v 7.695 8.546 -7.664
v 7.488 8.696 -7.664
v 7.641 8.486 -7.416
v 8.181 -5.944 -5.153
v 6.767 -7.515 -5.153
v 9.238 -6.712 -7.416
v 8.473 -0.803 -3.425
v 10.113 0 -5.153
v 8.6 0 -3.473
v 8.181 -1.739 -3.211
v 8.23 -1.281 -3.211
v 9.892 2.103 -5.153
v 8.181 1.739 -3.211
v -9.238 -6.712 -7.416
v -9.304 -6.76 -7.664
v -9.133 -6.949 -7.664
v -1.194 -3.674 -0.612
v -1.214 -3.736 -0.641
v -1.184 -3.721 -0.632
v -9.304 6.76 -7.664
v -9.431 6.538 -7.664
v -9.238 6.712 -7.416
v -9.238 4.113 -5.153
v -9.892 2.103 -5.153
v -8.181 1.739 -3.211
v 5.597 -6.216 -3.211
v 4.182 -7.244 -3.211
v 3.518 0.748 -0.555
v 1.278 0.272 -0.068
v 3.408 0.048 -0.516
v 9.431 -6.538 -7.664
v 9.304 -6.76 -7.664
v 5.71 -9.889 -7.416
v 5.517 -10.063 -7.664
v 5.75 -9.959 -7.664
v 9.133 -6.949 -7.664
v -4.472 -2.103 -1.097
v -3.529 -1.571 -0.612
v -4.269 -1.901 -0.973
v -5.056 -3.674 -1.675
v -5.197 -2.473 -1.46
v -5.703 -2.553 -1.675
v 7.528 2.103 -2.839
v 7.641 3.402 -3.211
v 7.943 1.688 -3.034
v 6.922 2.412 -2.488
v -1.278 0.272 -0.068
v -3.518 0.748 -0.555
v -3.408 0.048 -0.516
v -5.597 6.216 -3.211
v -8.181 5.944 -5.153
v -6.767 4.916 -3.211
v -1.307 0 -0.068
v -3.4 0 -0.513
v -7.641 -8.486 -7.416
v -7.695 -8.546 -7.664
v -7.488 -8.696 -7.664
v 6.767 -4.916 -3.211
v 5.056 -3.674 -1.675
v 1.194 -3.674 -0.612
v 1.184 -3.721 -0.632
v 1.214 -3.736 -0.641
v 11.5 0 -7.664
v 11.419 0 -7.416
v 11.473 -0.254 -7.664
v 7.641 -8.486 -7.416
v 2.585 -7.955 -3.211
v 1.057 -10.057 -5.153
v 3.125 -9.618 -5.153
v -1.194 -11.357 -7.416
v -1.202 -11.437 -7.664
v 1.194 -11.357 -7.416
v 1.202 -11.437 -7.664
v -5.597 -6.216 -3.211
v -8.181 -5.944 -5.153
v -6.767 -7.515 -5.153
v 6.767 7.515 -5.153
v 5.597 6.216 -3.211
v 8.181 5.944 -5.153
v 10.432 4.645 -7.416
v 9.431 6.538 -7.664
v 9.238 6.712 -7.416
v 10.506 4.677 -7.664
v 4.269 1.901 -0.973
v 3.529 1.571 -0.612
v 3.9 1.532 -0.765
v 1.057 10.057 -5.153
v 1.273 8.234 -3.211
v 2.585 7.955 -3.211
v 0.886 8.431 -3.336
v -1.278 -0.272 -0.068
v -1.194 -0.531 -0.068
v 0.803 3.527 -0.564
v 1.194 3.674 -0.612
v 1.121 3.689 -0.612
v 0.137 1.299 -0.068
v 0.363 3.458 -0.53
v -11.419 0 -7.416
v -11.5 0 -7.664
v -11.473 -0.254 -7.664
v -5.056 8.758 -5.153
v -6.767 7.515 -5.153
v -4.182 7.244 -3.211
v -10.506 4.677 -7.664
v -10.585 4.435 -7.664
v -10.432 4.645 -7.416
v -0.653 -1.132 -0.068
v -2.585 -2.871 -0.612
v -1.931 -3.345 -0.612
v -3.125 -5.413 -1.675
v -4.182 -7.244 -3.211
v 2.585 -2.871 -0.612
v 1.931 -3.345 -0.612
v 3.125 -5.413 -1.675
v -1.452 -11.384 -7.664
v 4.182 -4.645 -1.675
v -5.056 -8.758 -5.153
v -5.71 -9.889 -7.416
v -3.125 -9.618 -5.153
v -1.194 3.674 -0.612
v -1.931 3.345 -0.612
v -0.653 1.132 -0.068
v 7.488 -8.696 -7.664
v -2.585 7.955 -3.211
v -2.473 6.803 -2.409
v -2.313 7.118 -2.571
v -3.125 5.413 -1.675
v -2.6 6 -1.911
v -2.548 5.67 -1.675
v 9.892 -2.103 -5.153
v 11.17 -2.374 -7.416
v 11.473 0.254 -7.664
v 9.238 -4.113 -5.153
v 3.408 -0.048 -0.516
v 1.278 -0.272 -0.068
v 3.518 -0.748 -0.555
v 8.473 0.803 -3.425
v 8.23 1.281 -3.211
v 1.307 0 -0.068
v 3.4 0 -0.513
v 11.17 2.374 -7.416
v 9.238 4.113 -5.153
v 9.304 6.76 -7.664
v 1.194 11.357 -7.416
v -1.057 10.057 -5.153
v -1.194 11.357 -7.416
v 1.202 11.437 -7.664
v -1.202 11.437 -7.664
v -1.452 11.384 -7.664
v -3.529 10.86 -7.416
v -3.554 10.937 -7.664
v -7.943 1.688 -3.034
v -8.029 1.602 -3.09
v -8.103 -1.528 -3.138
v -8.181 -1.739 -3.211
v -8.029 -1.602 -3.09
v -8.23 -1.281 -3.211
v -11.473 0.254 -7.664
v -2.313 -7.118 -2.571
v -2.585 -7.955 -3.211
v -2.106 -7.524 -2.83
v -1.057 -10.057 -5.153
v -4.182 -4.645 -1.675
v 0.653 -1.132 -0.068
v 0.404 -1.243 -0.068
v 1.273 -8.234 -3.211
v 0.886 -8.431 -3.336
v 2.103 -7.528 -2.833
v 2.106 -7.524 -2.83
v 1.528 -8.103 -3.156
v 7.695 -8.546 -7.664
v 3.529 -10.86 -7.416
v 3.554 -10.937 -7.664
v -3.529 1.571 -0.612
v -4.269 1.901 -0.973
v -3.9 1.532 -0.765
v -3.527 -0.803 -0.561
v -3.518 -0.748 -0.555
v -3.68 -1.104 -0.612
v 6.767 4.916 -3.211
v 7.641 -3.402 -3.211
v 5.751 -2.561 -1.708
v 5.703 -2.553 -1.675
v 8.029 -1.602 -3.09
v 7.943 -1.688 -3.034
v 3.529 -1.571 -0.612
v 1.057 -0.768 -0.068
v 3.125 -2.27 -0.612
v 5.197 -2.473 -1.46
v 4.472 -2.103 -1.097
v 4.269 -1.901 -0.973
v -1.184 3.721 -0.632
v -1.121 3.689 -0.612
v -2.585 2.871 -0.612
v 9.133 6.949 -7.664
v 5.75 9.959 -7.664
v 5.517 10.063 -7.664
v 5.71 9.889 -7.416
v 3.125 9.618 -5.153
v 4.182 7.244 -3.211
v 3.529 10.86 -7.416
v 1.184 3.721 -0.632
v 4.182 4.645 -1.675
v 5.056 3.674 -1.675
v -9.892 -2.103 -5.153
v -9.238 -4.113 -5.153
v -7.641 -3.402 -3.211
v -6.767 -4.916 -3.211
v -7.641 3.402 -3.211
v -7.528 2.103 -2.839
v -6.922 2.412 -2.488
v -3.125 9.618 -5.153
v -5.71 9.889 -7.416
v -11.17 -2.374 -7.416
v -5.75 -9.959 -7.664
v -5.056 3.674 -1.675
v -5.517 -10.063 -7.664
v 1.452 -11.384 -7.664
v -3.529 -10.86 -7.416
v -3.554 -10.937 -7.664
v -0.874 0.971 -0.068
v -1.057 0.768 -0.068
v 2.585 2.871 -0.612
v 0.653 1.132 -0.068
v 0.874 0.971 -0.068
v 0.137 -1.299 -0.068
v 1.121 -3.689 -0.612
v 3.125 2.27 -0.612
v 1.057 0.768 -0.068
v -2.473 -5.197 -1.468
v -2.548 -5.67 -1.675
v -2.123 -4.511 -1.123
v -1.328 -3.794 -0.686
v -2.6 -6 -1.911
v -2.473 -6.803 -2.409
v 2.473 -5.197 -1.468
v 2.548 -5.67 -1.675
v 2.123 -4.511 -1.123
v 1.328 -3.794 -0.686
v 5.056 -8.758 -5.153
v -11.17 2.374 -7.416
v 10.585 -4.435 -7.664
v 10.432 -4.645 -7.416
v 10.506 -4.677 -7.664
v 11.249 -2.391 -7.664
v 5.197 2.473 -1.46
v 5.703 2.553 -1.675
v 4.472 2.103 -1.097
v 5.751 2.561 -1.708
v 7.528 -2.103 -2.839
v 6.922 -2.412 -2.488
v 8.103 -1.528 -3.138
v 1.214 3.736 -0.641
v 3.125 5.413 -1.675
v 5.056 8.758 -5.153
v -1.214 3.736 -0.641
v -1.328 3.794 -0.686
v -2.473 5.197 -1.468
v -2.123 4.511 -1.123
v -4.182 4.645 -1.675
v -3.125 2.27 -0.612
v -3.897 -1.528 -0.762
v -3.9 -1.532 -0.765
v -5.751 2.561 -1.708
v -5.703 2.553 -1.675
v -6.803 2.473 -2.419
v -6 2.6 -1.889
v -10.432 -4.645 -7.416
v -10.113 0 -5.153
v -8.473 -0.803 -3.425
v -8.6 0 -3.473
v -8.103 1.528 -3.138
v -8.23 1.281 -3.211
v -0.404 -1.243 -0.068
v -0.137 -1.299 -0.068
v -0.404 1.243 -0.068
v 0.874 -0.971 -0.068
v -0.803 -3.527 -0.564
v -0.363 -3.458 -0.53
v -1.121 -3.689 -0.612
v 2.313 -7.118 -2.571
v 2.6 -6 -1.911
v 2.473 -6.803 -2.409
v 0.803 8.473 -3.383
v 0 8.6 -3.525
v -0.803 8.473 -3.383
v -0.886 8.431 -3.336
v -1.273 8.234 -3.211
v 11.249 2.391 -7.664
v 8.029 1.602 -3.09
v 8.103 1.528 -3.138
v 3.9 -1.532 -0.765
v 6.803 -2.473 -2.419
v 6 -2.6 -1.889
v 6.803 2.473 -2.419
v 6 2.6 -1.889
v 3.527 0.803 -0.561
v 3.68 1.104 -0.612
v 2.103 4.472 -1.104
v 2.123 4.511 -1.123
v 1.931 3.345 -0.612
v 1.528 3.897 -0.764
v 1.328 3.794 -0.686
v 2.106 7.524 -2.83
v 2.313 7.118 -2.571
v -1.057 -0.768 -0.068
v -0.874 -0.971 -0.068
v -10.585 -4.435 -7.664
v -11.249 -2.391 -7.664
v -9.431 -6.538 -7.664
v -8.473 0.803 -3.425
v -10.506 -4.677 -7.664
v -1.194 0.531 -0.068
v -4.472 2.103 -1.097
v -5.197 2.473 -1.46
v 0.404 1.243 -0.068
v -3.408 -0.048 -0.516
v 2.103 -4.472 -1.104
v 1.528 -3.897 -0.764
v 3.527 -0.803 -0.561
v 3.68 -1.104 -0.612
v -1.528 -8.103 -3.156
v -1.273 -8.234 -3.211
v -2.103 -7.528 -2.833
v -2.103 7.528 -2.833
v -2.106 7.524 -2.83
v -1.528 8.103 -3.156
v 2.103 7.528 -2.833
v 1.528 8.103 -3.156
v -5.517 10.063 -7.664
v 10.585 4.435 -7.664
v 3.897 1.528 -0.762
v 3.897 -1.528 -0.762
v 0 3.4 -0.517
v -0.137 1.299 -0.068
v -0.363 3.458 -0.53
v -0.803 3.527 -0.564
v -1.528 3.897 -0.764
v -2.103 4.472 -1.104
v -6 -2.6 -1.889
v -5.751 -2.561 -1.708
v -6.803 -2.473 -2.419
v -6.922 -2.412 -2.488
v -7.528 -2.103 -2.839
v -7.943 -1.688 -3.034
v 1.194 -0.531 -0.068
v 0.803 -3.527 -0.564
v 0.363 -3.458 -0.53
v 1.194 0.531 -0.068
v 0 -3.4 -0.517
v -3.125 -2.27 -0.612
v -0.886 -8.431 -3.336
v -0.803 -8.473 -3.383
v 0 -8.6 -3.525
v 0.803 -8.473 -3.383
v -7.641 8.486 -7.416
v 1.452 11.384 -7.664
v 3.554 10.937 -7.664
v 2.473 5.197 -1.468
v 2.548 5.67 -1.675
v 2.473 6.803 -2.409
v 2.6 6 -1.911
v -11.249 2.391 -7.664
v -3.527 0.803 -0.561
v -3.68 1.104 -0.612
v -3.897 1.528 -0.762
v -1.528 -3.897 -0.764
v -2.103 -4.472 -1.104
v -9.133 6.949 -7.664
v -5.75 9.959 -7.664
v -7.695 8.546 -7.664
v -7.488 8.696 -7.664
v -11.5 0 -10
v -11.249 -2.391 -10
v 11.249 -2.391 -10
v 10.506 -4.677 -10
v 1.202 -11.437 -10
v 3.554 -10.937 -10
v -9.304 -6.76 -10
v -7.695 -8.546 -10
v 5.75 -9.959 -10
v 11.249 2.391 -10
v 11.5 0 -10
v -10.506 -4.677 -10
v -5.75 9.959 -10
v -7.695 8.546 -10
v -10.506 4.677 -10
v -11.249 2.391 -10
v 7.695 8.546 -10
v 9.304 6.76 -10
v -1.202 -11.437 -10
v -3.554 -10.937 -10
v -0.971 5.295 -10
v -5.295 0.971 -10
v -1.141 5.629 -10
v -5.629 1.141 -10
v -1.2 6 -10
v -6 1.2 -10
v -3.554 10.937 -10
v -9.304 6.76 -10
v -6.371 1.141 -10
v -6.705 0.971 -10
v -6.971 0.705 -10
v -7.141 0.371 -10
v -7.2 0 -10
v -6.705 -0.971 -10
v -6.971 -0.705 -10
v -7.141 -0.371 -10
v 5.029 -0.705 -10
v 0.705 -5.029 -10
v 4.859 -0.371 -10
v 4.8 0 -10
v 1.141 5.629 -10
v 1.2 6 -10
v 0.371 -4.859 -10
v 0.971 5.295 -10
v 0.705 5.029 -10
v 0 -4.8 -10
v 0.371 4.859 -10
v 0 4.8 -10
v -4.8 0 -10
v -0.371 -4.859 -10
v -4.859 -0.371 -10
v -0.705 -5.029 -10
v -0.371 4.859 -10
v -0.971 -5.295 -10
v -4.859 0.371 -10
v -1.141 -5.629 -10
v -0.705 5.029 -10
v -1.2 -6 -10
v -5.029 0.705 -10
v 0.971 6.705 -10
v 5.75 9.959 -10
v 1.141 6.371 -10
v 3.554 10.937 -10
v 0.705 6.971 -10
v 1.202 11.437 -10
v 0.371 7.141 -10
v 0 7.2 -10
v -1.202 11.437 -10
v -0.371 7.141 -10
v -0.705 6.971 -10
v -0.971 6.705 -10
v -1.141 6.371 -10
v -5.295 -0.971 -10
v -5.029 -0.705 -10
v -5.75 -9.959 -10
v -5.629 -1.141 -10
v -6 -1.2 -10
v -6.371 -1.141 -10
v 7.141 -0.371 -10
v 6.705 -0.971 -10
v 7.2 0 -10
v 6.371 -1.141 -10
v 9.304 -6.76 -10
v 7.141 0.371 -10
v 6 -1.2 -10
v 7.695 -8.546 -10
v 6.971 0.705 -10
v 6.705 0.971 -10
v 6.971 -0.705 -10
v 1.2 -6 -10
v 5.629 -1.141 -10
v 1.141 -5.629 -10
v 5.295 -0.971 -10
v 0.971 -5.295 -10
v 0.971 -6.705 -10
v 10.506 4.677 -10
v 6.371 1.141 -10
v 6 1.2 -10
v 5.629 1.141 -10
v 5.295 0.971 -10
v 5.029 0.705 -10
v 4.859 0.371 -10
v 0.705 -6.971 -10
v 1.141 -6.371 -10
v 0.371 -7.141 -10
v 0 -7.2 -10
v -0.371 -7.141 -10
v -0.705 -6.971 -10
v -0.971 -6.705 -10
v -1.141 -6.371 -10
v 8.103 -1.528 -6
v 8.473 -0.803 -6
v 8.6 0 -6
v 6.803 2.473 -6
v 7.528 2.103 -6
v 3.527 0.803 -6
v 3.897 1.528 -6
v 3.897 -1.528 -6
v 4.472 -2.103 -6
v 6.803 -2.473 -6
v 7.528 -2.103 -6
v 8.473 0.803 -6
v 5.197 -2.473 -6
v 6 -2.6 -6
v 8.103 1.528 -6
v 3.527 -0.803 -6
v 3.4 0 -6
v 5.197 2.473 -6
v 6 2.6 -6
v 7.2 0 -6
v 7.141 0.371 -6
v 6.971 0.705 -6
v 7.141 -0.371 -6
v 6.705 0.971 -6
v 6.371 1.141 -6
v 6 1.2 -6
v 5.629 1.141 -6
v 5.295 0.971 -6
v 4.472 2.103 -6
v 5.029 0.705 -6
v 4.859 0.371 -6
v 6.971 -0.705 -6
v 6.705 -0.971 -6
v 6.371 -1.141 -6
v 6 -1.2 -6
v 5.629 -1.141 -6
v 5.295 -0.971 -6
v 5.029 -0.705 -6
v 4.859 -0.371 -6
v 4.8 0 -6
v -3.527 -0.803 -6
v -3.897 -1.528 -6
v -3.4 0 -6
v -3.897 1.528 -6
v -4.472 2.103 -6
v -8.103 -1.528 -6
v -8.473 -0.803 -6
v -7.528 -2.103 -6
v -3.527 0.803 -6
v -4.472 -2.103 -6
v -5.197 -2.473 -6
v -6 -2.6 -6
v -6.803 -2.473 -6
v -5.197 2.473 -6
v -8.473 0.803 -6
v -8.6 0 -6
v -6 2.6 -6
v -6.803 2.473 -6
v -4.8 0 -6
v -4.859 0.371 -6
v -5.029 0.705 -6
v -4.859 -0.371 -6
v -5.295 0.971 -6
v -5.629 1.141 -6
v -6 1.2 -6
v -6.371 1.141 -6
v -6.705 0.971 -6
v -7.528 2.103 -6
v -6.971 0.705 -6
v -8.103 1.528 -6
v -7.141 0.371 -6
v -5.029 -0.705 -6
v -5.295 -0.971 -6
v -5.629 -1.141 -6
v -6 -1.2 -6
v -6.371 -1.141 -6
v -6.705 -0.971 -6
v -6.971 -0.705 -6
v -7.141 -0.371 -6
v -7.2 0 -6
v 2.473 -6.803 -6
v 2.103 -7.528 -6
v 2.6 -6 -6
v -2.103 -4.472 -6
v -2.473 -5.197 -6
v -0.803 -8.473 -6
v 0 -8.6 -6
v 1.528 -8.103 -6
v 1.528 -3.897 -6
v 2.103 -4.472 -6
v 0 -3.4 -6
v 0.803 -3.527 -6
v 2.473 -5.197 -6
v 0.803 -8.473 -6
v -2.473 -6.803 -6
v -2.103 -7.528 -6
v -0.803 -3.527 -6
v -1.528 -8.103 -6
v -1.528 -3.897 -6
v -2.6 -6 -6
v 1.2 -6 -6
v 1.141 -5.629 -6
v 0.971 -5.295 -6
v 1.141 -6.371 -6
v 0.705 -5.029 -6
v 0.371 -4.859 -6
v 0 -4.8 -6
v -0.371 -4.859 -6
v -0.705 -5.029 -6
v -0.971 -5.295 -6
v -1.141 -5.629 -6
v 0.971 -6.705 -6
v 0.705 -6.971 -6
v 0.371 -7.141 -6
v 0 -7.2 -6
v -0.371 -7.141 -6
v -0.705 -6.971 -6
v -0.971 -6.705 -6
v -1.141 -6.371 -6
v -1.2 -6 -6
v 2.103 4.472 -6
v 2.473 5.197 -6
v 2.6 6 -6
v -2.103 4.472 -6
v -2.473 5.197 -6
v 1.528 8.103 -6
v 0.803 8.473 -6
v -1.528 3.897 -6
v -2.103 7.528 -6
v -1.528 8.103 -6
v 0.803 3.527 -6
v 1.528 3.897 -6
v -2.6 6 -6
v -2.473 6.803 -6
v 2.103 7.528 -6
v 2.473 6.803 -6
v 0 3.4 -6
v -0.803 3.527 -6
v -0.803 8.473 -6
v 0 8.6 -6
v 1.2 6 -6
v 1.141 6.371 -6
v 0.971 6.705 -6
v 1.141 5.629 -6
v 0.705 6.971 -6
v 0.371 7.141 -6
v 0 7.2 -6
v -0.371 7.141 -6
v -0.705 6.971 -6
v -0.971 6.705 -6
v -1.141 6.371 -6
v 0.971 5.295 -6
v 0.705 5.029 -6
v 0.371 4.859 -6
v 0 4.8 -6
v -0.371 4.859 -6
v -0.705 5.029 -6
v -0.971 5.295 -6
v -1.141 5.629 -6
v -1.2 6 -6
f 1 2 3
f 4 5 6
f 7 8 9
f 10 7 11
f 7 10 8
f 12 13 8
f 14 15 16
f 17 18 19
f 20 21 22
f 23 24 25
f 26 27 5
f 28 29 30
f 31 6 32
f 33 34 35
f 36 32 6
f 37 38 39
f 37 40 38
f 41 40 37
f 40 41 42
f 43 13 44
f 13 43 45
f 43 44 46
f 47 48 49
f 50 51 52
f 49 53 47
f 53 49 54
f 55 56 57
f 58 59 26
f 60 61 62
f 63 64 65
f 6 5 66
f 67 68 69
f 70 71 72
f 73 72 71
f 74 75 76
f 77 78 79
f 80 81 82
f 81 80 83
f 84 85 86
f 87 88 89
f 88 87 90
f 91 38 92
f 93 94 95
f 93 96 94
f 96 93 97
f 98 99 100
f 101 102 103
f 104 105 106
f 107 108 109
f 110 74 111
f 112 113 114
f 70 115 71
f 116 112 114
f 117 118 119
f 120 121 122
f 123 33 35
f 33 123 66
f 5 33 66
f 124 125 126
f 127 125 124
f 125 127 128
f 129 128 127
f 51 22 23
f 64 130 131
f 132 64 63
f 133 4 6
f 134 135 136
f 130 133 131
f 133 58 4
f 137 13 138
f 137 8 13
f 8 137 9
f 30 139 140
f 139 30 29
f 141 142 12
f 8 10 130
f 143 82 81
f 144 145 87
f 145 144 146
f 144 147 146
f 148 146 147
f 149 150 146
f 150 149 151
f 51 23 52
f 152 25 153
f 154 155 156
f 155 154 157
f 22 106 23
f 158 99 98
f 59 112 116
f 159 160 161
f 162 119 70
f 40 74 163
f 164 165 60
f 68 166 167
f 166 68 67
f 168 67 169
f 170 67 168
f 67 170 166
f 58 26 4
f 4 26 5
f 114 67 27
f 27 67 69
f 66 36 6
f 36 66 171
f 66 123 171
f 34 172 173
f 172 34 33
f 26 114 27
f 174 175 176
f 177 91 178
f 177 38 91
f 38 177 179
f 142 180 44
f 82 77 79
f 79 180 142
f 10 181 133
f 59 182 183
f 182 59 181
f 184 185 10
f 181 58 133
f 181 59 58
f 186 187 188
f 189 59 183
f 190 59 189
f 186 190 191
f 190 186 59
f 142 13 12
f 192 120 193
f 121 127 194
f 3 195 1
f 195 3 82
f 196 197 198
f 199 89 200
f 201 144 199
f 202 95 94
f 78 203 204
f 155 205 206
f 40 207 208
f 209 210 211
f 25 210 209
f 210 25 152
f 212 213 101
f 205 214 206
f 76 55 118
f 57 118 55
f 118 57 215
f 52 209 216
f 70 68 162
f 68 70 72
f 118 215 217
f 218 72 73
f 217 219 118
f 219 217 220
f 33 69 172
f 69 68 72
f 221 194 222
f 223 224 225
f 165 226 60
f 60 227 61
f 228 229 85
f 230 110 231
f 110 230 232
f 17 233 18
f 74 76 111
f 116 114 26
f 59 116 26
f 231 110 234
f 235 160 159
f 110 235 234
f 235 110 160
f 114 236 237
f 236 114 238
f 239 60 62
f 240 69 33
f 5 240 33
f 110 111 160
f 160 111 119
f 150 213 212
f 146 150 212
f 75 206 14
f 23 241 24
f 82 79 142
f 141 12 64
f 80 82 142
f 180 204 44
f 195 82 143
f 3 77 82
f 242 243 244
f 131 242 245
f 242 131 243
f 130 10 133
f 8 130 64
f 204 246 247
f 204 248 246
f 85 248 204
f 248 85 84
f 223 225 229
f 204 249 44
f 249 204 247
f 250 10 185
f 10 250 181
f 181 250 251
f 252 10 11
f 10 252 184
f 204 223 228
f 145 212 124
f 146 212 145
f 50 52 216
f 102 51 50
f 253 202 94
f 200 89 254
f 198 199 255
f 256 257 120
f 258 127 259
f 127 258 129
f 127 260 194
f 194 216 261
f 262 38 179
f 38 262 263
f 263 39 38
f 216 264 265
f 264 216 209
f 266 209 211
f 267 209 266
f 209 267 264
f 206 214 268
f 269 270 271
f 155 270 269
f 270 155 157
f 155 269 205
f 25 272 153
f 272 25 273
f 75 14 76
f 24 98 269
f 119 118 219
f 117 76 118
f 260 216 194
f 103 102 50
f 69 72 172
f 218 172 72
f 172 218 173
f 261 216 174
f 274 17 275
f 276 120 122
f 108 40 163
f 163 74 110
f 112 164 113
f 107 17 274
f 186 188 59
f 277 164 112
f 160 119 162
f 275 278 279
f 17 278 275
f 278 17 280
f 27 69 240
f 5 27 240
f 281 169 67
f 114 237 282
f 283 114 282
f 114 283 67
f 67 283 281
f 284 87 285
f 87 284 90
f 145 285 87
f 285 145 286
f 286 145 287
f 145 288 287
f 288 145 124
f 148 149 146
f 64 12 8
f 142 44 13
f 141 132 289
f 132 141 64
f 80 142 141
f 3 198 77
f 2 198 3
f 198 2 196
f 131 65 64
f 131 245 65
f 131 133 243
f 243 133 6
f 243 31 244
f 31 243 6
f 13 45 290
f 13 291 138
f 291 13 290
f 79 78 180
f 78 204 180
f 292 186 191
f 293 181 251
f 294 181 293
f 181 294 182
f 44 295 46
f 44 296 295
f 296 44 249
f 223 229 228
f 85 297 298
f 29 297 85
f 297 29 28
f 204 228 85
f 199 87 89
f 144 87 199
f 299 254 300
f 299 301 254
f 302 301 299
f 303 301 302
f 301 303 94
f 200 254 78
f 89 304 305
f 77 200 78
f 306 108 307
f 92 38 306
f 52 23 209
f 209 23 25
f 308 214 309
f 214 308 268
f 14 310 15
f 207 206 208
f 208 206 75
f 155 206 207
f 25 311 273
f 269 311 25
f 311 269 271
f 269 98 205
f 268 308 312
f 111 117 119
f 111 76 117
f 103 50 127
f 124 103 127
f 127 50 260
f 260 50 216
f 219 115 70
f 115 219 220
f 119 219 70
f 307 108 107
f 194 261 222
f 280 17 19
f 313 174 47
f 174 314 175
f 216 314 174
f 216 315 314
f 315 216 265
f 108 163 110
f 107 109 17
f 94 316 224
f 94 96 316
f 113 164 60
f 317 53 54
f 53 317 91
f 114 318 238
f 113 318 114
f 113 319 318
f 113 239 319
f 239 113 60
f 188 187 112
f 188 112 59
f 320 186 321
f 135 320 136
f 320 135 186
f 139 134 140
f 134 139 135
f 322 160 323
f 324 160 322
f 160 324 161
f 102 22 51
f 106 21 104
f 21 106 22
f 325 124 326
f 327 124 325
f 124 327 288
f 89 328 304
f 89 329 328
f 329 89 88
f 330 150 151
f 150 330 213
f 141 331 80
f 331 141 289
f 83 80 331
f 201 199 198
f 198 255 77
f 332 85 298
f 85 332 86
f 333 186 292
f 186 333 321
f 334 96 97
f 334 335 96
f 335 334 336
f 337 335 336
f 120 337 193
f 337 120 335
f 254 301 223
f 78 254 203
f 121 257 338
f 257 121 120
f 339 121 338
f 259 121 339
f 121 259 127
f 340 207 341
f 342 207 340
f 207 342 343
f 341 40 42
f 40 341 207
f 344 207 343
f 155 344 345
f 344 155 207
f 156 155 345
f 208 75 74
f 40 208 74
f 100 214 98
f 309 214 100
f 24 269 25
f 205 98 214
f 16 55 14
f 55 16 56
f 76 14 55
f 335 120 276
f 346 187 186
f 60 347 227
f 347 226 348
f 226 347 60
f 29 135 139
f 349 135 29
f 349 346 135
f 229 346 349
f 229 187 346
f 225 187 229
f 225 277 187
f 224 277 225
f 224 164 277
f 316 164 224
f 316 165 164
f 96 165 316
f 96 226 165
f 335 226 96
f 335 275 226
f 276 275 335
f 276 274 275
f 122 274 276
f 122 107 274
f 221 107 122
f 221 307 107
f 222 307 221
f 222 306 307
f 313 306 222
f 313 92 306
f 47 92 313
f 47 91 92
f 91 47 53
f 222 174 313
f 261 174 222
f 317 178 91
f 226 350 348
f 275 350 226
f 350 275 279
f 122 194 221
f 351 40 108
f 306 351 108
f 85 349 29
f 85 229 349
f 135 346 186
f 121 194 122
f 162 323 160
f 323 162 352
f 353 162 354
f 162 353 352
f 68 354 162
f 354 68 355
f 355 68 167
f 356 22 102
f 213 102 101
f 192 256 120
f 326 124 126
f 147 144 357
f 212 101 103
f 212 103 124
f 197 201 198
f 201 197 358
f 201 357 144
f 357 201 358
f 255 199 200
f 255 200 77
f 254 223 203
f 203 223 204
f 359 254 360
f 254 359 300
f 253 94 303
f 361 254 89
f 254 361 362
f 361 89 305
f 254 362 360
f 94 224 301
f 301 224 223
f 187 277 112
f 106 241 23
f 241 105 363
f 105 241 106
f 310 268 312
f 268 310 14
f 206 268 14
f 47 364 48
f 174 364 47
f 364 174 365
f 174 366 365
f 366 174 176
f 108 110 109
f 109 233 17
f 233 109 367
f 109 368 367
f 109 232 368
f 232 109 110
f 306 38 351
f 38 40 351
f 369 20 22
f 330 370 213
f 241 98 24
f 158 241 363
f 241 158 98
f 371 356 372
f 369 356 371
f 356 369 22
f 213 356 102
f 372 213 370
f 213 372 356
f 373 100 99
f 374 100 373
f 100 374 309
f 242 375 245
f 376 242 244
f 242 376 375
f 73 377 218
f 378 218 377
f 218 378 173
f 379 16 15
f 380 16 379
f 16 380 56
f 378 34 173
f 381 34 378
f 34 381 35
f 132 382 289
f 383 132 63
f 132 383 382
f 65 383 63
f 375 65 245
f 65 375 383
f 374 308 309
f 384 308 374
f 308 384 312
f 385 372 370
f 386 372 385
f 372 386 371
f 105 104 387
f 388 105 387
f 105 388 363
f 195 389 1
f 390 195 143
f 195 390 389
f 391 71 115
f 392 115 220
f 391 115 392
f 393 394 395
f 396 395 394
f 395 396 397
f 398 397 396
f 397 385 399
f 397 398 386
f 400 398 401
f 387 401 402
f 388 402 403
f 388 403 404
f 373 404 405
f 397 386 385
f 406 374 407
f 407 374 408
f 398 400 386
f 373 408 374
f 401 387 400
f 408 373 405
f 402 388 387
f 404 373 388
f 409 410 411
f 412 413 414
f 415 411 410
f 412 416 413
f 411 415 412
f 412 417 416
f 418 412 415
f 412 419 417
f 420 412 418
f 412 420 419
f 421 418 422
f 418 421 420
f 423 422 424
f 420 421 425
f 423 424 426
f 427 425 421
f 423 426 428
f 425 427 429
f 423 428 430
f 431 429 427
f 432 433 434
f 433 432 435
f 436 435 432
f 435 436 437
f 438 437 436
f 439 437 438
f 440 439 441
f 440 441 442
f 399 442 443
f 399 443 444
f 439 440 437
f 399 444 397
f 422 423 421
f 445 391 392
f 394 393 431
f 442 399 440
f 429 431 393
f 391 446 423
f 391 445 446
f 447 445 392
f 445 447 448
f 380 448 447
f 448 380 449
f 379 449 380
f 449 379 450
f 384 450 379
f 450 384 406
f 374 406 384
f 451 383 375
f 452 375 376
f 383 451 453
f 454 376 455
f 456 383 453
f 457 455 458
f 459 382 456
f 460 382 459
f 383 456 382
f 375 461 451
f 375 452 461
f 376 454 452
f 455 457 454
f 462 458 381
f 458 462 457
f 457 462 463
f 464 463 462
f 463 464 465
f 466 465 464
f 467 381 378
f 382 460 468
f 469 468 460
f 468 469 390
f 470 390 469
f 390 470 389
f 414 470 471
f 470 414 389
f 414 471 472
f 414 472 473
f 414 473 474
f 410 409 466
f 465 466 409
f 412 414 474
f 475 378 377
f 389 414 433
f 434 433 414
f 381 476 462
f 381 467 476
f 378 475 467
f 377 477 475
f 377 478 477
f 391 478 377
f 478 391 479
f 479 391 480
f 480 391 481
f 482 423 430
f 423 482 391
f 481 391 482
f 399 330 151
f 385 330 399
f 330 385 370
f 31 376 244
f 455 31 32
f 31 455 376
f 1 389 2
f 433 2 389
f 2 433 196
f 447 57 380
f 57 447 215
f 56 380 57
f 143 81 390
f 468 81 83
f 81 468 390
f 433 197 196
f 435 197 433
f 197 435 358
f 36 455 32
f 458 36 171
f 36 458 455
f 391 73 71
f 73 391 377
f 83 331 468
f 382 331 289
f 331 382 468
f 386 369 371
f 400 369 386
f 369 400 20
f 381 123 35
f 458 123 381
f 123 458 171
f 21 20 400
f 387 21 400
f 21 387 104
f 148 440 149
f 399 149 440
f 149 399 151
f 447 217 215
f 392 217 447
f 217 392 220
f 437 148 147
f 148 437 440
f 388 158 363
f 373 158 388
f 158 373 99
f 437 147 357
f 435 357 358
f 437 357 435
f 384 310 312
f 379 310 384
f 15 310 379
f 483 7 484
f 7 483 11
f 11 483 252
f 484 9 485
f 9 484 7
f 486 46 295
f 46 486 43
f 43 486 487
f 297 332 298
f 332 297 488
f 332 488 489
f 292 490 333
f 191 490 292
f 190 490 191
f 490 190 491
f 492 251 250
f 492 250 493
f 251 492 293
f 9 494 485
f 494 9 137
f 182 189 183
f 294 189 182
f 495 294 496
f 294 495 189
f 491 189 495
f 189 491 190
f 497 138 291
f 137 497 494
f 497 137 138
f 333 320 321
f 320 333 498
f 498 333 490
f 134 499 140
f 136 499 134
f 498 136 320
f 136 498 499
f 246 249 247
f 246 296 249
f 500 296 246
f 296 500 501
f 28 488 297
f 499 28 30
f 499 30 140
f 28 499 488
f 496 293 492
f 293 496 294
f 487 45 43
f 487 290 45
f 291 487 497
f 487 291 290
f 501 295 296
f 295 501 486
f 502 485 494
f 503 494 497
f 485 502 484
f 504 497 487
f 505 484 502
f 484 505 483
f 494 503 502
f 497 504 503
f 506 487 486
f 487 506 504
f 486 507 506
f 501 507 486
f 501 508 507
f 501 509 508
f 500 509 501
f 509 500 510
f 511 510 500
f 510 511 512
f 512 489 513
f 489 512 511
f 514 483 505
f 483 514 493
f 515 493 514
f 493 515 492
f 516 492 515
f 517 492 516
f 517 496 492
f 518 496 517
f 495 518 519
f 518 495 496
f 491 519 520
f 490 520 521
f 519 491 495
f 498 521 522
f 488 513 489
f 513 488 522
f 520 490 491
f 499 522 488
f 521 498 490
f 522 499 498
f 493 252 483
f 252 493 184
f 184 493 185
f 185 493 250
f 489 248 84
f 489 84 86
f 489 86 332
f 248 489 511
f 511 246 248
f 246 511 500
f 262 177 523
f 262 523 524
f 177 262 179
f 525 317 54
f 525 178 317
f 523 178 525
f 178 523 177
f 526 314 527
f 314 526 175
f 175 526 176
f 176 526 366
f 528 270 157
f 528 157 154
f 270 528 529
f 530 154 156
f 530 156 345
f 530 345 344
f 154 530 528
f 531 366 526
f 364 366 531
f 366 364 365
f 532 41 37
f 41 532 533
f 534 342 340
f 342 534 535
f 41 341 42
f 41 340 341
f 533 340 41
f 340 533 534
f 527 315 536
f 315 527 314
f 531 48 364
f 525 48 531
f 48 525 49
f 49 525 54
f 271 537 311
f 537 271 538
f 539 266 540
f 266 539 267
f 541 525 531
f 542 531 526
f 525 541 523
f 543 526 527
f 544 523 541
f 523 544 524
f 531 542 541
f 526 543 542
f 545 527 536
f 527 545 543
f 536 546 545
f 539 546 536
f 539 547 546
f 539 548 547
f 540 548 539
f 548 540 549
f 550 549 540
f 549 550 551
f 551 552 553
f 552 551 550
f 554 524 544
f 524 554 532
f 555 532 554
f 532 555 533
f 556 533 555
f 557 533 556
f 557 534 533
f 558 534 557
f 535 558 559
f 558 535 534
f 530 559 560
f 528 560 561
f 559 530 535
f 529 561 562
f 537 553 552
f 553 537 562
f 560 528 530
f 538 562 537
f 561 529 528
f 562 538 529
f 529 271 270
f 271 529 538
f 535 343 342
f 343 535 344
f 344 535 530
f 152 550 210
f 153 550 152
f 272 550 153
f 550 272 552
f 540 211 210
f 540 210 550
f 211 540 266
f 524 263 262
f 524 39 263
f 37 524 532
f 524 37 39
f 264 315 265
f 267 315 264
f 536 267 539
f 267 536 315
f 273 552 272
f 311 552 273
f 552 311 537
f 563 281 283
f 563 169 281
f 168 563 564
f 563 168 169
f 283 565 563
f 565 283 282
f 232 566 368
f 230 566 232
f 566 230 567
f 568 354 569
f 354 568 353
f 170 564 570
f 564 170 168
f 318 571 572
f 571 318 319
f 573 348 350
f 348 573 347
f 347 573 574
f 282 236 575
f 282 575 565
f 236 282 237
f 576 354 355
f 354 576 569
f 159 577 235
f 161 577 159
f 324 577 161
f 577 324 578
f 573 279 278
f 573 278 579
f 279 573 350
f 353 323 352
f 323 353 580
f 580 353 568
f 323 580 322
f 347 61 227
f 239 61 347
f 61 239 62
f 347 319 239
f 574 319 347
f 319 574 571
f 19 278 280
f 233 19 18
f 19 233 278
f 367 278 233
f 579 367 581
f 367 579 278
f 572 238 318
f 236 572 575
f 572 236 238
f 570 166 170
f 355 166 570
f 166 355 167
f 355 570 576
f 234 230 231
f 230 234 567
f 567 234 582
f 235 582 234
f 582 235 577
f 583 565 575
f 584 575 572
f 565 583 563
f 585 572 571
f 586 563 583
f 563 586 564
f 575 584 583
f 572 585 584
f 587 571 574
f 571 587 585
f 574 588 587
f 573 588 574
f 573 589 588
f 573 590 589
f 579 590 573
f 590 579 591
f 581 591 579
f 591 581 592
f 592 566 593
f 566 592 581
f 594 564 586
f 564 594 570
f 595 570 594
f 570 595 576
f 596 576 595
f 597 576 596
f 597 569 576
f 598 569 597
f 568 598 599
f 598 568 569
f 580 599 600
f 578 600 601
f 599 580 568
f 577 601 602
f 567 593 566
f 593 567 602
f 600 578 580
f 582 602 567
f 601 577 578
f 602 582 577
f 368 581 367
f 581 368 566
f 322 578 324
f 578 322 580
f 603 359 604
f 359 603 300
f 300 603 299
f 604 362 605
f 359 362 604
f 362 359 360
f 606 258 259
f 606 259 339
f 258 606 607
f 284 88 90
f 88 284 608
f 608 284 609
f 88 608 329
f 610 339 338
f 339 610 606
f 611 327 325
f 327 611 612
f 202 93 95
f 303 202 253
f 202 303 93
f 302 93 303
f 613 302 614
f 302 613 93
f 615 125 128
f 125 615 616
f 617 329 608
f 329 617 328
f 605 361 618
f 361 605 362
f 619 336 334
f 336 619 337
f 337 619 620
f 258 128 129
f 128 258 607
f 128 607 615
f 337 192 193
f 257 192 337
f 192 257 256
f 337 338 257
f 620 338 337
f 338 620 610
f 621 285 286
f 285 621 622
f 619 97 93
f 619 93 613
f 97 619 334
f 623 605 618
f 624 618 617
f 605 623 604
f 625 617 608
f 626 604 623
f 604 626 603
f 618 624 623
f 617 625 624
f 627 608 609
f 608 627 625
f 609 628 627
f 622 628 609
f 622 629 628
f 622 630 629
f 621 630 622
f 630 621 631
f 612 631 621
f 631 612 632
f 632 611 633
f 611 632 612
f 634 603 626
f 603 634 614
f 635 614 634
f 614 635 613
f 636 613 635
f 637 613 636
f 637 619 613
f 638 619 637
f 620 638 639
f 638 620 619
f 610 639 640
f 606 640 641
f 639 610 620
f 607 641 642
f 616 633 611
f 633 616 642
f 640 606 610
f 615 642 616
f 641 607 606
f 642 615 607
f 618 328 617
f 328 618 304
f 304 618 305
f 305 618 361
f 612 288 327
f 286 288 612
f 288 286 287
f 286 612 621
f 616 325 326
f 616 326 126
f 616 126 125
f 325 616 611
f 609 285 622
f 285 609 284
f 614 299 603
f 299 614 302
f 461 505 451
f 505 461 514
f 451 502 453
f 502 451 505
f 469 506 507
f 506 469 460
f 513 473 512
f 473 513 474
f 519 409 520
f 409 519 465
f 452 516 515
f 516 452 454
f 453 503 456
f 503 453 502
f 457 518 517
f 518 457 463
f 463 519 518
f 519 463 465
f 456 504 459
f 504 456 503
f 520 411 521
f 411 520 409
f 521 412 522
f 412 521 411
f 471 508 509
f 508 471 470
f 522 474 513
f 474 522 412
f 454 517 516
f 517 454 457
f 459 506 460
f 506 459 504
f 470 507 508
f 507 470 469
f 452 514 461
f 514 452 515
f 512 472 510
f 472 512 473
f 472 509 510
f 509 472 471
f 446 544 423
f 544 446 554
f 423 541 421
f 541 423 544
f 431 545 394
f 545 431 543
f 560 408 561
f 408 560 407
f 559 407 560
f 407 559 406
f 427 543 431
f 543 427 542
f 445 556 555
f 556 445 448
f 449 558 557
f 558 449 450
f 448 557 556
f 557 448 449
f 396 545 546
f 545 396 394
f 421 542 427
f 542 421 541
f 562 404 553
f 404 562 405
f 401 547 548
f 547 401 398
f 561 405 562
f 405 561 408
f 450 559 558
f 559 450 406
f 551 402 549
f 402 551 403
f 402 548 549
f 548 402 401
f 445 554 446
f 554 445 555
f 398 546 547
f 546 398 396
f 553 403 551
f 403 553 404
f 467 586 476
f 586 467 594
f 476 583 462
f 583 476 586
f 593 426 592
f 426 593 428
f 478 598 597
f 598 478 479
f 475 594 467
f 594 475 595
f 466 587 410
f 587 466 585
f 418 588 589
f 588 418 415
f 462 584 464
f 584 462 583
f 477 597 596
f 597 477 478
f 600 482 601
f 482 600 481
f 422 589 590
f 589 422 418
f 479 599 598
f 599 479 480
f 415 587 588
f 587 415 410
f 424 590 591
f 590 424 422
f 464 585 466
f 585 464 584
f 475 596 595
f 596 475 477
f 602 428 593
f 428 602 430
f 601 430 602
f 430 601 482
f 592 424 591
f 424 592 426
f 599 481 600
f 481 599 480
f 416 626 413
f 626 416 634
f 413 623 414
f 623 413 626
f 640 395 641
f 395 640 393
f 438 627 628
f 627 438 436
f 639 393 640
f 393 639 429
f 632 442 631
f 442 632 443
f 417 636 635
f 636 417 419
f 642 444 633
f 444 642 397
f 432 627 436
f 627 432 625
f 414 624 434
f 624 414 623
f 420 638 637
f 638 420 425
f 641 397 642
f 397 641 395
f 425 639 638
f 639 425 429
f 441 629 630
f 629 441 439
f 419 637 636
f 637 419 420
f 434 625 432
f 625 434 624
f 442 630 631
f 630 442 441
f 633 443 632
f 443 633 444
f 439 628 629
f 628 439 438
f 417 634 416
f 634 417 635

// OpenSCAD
// Diameter of skid (same as motor works well)
diameter        = 23;

// Height of skid, wanna stand tall?
height          = 10;

// Diameter of the sphere used for curved bottom of skid
curvature       = 25;

// Motor mounting hole spacing, first dimension
spacing1        = 12;
// Motor mounting hole spacing, second dimension
spacing2        = 12;

// Motor mounting screw size, adjusted for clearance
holesize        = 2; // [2:M2, 3:M3]

// Thickness of base (increases motor screw lengths)
thickness       = 4; // [1:1MM, 2:2MM, 3:3MM, 4:4MM]

// Rounded is heavier and stonger and cross is lighter.
style           = 1; // [1:Rounded, 2:Cross]

holesize_r      = holesize/2;
curvature_r     = curvature/2;
diameter_r      = diameter/2;

// Rotate it for correct printing orientation.
rotate([180, 0, 0]) {
    difference() {
        // Skid body
        intersection() {
            translate([0, 0, curvature_r]) sphere(r=curvature_r);
            cylinder(r=diameter_r, h=height);
        }

        // Mounting holes
        // Screw shafts
        translate([spacing1/2, 0, 0]) cylinder(r=holesize_r*1.2, h=height, $fn=20);
        translate([0-spacing1/2, 0, 0]) cylinder(r=holesize_r*1.2, h=height, $fn=20);
        translate([0, spacing2/2, 0]) cylinder(r=holesize_r*1.2, h=height, $fn=20);
        translate([0, 0-spacing2/2, 0]) cylinder(r=holesize_r*1.2, h=height, $fn=20);

        if (style==1) {
            // Style: Rounded
            // Screw head insets
            translate([spacing1/2, 0, 0]) cylinder(r=holesize_r+1.6, h=height-thickness, $fn=20);
            translate([0-spacing1/2, 0, 0]) cylinder(r=holesize_r+1.6, h=height-thickness, $fn=20);
            translate([0, spacing2/2, 0]) cylinder(r=holesize_r+1.6, h=height-thickness, $fn=20);
            translate([0, 0-spacing2/2, 0]) cylinder(r=holesize_r+1.6, h=height-thickness, $fn=20);
        } else {
            // Style: Cross
            // Trianglular cutouts
            rotate([0, 0, 45]) translate([1.5, 1.5, 0-thickness]) cube([diameter_r, diameter_r, height]);
            rotate([0, 0, -45]) translate([1.5, 1.5, 0-thickness]) cube([diameter_r, diameter_r, height]);
            rotate([0, 0, 135]) translate([1.5, 1.5, 0-thickness]) cube([diameter_r, diameter_r, height]);
            rotate([0, 0, 225]) translate([1.5, 1.5, 0-thickness]) cube([diameter_r, diameter_r, height]);
        }
    }
}
